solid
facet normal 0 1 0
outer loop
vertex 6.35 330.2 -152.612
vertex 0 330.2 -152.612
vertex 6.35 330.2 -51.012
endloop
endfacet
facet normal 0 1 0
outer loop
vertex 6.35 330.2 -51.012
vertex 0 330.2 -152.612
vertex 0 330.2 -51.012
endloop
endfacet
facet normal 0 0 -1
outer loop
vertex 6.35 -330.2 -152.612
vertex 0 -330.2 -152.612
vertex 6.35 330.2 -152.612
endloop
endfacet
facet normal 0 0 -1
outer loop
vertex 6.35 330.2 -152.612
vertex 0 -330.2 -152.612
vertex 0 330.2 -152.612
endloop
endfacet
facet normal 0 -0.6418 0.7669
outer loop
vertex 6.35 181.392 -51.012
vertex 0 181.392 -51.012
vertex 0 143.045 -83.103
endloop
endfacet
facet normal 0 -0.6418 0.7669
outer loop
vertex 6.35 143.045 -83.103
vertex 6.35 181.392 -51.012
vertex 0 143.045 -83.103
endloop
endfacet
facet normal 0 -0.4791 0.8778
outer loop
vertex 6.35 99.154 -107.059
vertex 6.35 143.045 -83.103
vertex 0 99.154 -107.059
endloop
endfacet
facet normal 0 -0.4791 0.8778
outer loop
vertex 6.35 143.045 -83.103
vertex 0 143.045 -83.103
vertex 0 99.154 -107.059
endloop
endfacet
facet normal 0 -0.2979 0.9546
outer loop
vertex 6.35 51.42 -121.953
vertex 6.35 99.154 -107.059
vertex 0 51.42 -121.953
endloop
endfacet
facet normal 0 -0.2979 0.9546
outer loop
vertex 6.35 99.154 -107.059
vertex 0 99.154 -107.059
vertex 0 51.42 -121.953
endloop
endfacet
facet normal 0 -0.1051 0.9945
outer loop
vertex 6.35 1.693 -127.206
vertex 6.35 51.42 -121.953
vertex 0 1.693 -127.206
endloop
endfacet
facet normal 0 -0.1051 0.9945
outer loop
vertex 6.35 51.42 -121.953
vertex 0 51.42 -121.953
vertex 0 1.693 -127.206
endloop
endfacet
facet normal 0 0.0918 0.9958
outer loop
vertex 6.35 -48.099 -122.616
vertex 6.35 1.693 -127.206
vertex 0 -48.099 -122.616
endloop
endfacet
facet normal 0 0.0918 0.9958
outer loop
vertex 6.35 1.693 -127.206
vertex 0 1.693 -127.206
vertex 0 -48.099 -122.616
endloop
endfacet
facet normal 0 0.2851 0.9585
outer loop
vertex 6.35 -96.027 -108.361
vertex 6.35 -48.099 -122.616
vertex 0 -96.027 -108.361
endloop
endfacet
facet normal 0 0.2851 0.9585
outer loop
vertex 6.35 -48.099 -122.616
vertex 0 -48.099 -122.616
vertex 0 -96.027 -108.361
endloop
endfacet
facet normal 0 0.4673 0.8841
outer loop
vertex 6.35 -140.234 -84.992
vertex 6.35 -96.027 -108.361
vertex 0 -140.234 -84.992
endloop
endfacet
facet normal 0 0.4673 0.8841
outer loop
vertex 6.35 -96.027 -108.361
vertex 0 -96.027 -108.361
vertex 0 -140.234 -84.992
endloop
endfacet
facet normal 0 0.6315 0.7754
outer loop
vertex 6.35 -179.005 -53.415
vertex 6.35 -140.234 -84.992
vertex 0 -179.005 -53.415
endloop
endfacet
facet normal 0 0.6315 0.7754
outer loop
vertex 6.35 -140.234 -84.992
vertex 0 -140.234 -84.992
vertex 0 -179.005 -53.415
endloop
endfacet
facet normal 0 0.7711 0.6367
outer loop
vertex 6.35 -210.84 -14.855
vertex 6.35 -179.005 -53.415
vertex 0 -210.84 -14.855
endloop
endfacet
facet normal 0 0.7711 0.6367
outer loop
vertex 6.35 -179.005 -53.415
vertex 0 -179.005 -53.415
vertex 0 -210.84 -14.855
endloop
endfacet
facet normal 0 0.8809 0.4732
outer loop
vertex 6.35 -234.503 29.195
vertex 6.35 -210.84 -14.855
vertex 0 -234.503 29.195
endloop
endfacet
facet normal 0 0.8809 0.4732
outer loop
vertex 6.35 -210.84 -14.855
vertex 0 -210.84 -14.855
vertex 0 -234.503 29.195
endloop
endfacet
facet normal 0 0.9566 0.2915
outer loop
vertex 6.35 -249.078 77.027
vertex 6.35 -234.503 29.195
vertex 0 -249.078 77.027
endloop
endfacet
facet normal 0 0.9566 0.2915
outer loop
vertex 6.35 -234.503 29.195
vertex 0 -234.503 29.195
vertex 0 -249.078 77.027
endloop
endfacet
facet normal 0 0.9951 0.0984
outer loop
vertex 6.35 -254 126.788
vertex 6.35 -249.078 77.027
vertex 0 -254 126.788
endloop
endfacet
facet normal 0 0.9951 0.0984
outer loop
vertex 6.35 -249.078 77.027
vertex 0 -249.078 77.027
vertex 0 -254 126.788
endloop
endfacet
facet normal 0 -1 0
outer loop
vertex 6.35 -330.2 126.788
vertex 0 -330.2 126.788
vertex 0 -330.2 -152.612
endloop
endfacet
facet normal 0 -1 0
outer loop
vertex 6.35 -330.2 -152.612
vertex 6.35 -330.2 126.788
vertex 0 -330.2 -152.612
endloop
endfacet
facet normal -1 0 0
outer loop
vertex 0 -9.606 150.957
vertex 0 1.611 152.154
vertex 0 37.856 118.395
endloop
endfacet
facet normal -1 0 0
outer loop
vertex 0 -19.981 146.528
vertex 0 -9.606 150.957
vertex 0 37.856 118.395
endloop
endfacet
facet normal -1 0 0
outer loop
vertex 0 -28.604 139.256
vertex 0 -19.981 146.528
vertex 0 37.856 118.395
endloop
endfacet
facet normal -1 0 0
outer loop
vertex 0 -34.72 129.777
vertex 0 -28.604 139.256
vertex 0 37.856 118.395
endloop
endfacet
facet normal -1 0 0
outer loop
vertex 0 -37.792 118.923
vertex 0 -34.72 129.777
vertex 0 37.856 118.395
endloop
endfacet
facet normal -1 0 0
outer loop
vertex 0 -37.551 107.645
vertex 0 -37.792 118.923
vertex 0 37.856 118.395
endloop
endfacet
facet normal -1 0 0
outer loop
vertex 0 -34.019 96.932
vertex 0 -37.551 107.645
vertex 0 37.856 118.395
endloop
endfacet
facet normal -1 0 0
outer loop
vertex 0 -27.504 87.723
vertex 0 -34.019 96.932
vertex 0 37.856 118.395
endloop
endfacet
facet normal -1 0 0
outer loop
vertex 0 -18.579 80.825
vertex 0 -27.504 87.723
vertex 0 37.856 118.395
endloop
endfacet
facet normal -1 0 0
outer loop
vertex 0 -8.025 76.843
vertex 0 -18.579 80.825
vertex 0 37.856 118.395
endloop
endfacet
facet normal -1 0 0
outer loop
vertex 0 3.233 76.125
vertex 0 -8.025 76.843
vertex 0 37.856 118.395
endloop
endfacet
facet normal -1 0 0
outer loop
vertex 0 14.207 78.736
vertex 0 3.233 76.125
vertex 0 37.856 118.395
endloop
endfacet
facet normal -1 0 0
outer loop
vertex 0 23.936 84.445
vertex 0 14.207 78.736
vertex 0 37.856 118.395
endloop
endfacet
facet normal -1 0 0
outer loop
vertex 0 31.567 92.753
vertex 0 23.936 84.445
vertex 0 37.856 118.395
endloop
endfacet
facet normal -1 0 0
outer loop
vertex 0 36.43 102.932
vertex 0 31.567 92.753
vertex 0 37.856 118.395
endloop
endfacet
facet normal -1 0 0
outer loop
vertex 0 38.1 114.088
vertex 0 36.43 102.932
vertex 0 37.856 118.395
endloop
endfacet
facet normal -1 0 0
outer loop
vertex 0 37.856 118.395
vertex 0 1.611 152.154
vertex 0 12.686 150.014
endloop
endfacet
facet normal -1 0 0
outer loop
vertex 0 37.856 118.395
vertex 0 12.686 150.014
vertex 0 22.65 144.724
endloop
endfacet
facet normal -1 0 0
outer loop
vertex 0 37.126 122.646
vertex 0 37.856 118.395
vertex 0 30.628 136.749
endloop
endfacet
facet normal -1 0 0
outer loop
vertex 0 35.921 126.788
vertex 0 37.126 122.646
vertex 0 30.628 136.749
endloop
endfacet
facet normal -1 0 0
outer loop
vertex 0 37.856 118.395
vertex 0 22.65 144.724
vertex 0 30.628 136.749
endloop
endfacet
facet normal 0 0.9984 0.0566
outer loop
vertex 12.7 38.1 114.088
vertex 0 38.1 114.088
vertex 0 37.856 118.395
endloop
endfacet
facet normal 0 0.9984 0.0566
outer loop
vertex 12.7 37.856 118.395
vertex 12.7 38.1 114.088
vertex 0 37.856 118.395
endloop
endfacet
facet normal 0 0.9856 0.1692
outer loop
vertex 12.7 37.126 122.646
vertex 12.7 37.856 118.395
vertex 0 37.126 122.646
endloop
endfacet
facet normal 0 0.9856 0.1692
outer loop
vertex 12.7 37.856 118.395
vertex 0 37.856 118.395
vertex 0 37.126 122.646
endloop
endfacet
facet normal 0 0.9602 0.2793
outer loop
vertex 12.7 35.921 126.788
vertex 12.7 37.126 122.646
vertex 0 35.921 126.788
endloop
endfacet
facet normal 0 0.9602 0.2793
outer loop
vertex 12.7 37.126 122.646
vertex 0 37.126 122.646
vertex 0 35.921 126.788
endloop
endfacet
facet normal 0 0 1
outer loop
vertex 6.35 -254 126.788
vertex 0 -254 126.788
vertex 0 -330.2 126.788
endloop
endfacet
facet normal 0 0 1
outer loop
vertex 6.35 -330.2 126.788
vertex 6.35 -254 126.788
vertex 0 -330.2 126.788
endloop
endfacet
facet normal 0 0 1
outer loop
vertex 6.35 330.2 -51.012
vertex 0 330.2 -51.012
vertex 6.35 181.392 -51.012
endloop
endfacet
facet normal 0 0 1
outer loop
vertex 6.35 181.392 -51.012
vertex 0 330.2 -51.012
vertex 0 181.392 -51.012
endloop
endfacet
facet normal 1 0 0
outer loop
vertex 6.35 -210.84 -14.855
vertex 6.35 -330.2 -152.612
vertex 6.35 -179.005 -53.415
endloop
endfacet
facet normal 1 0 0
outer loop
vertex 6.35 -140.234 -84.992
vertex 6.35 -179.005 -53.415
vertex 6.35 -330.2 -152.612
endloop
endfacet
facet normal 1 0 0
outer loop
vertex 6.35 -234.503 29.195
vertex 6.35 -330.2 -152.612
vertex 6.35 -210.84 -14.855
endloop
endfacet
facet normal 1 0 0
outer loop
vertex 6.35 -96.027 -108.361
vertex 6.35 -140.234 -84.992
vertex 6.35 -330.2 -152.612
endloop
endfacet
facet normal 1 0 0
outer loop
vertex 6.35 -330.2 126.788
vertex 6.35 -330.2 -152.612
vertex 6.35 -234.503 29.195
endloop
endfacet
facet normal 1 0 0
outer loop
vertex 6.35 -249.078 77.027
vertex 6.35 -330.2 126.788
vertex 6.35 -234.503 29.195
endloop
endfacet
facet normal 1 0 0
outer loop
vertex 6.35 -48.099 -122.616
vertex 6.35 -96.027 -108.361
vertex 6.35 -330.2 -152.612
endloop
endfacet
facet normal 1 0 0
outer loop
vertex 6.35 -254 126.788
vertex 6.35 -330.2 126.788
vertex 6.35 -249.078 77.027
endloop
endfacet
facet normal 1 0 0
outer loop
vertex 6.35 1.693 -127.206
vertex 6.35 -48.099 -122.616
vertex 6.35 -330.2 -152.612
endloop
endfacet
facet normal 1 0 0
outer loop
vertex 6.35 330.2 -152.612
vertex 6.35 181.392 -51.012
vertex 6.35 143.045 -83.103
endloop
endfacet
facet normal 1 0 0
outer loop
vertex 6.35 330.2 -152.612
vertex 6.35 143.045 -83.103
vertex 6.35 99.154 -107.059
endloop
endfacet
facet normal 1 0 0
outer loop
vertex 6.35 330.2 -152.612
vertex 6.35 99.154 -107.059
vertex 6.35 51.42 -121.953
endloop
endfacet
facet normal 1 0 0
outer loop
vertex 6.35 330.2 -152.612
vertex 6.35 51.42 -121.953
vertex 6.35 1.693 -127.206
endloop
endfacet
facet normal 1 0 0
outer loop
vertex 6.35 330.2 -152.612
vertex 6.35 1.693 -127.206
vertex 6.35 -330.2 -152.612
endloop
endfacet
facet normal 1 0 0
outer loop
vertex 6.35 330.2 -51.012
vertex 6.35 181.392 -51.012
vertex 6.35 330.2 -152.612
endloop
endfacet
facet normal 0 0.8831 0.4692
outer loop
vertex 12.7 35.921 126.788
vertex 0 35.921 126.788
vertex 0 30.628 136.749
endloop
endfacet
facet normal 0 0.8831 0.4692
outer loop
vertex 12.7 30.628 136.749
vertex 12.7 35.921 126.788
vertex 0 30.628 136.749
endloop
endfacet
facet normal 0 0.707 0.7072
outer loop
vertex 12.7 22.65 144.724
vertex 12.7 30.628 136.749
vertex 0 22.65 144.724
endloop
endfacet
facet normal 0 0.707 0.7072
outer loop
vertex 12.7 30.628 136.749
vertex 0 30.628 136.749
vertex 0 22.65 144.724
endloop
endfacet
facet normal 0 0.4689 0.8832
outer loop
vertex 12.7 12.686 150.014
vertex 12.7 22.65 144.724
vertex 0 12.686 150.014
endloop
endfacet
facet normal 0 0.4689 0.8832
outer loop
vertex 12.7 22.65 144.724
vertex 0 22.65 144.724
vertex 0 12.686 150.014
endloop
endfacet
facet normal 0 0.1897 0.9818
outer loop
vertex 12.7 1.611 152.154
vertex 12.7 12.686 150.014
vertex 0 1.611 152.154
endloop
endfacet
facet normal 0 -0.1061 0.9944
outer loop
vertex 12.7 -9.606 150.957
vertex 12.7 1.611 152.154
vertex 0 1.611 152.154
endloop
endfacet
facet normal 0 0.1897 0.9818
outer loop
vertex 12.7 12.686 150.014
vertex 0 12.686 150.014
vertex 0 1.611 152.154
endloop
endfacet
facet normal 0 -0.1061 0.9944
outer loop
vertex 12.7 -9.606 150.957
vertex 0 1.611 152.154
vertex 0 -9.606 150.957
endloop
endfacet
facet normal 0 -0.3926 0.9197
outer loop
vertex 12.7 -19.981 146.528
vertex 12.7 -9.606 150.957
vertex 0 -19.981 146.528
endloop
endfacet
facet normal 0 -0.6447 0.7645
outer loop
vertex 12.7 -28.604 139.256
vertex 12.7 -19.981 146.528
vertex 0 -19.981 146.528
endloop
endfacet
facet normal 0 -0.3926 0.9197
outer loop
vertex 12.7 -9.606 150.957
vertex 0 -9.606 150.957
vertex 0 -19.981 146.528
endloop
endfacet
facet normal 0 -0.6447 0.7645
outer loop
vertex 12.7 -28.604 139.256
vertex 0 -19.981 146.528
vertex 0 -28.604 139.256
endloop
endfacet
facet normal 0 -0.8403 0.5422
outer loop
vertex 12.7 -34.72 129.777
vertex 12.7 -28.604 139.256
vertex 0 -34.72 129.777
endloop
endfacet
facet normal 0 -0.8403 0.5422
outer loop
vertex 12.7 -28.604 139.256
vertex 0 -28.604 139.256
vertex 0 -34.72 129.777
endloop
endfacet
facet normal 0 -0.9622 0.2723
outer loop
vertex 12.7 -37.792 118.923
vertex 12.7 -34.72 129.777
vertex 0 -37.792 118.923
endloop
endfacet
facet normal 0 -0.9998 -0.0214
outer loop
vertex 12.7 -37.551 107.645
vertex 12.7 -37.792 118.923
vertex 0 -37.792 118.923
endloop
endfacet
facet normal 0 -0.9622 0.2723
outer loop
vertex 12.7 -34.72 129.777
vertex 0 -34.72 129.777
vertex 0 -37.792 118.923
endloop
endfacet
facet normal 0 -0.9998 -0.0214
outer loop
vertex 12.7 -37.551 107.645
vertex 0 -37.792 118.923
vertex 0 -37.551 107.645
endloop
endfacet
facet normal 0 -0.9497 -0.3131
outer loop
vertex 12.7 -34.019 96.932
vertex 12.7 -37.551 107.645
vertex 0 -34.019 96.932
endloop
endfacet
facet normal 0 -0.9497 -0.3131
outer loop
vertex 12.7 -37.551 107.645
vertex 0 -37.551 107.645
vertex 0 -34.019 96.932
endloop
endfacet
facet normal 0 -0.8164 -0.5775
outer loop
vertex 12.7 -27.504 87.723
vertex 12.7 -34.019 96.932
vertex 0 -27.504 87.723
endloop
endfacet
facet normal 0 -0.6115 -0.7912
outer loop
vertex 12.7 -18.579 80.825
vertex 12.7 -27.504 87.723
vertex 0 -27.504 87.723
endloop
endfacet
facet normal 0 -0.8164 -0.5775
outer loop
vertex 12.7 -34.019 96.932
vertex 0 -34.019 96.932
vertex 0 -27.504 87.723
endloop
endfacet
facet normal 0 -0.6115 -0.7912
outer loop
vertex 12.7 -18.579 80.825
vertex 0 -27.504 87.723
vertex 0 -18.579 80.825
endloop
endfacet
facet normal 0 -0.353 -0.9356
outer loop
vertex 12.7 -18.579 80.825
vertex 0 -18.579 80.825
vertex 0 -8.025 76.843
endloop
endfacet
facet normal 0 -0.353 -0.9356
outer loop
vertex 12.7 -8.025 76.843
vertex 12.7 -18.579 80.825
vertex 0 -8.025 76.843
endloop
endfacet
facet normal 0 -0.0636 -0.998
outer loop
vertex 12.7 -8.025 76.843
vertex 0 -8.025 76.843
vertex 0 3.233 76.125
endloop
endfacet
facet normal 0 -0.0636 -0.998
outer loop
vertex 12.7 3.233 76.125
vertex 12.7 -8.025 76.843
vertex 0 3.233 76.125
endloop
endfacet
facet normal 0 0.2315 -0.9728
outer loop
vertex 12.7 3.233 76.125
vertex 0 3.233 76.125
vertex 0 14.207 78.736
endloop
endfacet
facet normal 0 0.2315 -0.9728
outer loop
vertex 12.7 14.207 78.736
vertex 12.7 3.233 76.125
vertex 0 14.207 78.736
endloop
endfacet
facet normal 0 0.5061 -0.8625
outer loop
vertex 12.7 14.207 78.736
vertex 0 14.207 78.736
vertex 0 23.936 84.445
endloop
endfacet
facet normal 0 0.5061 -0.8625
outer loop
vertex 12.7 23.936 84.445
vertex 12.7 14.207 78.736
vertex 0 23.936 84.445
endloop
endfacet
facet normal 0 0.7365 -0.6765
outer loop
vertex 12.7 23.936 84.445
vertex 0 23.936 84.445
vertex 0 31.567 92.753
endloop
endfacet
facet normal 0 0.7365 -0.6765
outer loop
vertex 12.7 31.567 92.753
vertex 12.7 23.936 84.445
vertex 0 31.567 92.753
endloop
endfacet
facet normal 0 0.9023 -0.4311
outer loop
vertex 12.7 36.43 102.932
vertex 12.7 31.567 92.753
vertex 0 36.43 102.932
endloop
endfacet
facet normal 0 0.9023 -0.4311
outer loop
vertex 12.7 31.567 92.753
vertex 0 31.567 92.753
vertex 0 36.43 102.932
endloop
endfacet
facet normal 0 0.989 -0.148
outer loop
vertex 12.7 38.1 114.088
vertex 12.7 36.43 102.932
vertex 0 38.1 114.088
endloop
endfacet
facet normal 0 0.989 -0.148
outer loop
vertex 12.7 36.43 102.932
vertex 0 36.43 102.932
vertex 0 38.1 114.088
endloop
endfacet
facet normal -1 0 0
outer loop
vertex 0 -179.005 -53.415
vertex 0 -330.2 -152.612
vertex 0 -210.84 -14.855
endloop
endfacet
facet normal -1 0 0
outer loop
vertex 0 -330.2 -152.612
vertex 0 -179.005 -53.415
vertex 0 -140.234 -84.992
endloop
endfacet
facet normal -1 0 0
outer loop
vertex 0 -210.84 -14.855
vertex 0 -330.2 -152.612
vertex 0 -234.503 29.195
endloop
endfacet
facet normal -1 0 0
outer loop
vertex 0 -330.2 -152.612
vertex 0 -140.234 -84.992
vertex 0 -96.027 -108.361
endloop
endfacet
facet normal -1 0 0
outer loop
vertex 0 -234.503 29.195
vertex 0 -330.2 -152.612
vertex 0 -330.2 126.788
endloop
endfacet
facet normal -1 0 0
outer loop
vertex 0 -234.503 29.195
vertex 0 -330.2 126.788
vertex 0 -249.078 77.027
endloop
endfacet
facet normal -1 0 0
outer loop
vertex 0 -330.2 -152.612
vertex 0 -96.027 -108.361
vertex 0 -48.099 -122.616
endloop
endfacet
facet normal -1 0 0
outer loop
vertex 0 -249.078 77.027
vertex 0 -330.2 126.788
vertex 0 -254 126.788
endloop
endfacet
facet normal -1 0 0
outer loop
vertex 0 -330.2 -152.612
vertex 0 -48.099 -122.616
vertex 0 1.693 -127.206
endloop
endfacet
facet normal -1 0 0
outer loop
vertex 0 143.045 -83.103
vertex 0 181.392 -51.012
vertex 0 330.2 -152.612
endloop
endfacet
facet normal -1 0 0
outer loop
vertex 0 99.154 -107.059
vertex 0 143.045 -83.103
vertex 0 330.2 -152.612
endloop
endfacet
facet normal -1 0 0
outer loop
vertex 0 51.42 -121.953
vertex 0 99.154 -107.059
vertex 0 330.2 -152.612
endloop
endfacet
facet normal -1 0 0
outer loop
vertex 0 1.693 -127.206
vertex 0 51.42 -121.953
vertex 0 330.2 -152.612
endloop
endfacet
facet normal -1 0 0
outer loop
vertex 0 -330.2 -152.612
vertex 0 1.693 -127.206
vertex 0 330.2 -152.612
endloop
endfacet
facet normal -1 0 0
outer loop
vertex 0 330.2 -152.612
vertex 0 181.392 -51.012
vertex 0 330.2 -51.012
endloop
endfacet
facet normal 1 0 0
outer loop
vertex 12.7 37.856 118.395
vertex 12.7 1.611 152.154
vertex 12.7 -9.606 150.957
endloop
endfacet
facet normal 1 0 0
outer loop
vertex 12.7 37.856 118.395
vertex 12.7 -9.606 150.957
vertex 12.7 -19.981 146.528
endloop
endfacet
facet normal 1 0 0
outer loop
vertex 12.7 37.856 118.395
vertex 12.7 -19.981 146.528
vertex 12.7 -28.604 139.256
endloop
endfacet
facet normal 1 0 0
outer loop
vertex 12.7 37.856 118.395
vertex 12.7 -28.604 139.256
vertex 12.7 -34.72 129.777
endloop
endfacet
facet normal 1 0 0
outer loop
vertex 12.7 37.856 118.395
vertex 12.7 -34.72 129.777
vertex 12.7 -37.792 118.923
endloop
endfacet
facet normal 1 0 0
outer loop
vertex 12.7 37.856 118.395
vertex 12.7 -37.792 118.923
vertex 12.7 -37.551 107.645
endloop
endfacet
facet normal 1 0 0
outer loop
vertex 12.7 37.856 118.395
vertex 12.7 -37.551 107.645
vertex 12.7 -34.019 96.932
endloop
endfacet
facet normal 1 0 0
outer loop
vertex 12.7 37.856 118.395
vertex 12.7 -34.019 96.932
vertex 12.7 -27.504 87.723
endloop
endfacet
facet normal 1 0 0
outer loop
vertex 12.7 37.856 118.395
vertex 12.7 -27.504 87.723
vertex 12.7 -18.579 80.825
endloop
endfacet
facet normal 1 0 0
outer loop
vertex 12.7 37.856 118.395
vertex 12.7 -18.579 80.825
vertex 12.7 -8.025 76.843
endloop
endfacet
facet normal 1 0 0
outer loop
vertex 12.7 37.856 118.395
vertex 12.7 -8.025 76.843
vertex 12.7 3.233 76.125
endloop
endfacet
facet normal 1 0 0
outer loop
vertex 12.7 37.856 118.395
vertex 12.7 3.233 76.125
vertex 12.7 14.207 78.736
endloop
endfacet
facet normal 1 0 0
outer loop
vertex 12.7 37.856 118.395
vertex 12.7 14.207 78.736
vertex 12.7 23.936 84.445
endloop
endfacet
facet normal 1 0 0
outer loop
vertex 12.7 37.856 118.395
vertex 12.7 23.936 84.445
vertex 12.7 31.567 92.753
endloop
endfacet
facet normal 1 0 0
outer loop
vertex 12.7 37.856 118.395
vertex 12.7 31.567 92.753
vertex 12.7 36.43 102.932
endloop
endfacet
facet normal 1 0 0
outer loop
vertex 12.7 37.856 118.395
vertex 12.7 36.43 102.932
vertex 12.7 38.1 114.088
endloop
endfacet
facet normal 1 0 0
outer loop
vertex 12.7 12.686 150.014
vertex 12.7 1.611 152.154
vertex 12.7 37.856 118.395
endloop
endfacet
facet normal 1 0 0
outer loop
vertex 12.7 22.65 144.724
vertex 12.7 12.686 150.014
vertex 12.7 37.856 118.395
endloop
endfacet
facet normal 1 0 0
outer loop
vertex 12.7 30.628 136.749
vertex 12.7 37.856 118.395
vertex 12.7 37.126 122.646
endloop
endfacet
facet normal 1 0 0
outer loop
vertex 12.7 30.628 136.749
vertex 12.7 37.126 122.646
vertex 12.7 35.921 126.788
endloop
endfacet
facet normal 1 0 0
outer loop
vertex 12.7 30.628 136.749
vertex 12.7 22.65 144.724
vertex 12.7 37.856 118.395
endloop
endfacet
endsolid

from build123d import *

# Parameters (mm, degrees)
F1_DEPTH = 6.35
F2_DEPTH = 12.7


with BuildPart() as f1:
    # F0 (on Right) → F1 (new body)
    with BuildSketch(Plane.YZ):
        with BuildLine():
            Line((330.2, -51.0121139765), (181.392282085, -51.0121139765))
            ThreePointArc((181.392282085, -51.0121139765), (-96.026976289, -108.3606198718), (-254, 126.7878860235))
            Line((-254, 126.7878860235), (-330.2, 126.7878860235))
            Line((-330.2, 126.7878860235), (-330.2, -152.6121139765))
            Line((-330.2, -152.6121139765), (330.2, -152.6121139765))
            Line((330.2, -152.6121139765), (330.2, -51.0121139765))
        make_face()
    extrude(amount=F1_DEPTH)


with BuildPart() as f2:
    # F0 (on Right) → F2 (new body)
    with BuildSketch(Plane.YZ):
        with BuildLine():
            Line((-35.9210244843, 126.7878860235), (35.9210244843, 126.7878860235))
            ThreePointArc((35.9210244843, 126.7878860235), (0, 152.1878860235), (-35.9210244843, 126.7878860235))
        make_face()
        with BuildLine():
            ThreePointArc((38.1, 114.0878860235), (37.5513051228, 120.530671413), (35.9210244843, 126.7878860235))
            Line((35.9210244843, 126.7878860235), (-35.9210244843, 126.7878860235))
            ThreePointArc((-35.9210244843, 126.7878860235), (-6.4427853895, 76.5365809007), (38.1, 114.0878860235))
        make_face()
    extrude(amount=F2_DEPTH)


solid = Compound([f1.part, f2.part])
